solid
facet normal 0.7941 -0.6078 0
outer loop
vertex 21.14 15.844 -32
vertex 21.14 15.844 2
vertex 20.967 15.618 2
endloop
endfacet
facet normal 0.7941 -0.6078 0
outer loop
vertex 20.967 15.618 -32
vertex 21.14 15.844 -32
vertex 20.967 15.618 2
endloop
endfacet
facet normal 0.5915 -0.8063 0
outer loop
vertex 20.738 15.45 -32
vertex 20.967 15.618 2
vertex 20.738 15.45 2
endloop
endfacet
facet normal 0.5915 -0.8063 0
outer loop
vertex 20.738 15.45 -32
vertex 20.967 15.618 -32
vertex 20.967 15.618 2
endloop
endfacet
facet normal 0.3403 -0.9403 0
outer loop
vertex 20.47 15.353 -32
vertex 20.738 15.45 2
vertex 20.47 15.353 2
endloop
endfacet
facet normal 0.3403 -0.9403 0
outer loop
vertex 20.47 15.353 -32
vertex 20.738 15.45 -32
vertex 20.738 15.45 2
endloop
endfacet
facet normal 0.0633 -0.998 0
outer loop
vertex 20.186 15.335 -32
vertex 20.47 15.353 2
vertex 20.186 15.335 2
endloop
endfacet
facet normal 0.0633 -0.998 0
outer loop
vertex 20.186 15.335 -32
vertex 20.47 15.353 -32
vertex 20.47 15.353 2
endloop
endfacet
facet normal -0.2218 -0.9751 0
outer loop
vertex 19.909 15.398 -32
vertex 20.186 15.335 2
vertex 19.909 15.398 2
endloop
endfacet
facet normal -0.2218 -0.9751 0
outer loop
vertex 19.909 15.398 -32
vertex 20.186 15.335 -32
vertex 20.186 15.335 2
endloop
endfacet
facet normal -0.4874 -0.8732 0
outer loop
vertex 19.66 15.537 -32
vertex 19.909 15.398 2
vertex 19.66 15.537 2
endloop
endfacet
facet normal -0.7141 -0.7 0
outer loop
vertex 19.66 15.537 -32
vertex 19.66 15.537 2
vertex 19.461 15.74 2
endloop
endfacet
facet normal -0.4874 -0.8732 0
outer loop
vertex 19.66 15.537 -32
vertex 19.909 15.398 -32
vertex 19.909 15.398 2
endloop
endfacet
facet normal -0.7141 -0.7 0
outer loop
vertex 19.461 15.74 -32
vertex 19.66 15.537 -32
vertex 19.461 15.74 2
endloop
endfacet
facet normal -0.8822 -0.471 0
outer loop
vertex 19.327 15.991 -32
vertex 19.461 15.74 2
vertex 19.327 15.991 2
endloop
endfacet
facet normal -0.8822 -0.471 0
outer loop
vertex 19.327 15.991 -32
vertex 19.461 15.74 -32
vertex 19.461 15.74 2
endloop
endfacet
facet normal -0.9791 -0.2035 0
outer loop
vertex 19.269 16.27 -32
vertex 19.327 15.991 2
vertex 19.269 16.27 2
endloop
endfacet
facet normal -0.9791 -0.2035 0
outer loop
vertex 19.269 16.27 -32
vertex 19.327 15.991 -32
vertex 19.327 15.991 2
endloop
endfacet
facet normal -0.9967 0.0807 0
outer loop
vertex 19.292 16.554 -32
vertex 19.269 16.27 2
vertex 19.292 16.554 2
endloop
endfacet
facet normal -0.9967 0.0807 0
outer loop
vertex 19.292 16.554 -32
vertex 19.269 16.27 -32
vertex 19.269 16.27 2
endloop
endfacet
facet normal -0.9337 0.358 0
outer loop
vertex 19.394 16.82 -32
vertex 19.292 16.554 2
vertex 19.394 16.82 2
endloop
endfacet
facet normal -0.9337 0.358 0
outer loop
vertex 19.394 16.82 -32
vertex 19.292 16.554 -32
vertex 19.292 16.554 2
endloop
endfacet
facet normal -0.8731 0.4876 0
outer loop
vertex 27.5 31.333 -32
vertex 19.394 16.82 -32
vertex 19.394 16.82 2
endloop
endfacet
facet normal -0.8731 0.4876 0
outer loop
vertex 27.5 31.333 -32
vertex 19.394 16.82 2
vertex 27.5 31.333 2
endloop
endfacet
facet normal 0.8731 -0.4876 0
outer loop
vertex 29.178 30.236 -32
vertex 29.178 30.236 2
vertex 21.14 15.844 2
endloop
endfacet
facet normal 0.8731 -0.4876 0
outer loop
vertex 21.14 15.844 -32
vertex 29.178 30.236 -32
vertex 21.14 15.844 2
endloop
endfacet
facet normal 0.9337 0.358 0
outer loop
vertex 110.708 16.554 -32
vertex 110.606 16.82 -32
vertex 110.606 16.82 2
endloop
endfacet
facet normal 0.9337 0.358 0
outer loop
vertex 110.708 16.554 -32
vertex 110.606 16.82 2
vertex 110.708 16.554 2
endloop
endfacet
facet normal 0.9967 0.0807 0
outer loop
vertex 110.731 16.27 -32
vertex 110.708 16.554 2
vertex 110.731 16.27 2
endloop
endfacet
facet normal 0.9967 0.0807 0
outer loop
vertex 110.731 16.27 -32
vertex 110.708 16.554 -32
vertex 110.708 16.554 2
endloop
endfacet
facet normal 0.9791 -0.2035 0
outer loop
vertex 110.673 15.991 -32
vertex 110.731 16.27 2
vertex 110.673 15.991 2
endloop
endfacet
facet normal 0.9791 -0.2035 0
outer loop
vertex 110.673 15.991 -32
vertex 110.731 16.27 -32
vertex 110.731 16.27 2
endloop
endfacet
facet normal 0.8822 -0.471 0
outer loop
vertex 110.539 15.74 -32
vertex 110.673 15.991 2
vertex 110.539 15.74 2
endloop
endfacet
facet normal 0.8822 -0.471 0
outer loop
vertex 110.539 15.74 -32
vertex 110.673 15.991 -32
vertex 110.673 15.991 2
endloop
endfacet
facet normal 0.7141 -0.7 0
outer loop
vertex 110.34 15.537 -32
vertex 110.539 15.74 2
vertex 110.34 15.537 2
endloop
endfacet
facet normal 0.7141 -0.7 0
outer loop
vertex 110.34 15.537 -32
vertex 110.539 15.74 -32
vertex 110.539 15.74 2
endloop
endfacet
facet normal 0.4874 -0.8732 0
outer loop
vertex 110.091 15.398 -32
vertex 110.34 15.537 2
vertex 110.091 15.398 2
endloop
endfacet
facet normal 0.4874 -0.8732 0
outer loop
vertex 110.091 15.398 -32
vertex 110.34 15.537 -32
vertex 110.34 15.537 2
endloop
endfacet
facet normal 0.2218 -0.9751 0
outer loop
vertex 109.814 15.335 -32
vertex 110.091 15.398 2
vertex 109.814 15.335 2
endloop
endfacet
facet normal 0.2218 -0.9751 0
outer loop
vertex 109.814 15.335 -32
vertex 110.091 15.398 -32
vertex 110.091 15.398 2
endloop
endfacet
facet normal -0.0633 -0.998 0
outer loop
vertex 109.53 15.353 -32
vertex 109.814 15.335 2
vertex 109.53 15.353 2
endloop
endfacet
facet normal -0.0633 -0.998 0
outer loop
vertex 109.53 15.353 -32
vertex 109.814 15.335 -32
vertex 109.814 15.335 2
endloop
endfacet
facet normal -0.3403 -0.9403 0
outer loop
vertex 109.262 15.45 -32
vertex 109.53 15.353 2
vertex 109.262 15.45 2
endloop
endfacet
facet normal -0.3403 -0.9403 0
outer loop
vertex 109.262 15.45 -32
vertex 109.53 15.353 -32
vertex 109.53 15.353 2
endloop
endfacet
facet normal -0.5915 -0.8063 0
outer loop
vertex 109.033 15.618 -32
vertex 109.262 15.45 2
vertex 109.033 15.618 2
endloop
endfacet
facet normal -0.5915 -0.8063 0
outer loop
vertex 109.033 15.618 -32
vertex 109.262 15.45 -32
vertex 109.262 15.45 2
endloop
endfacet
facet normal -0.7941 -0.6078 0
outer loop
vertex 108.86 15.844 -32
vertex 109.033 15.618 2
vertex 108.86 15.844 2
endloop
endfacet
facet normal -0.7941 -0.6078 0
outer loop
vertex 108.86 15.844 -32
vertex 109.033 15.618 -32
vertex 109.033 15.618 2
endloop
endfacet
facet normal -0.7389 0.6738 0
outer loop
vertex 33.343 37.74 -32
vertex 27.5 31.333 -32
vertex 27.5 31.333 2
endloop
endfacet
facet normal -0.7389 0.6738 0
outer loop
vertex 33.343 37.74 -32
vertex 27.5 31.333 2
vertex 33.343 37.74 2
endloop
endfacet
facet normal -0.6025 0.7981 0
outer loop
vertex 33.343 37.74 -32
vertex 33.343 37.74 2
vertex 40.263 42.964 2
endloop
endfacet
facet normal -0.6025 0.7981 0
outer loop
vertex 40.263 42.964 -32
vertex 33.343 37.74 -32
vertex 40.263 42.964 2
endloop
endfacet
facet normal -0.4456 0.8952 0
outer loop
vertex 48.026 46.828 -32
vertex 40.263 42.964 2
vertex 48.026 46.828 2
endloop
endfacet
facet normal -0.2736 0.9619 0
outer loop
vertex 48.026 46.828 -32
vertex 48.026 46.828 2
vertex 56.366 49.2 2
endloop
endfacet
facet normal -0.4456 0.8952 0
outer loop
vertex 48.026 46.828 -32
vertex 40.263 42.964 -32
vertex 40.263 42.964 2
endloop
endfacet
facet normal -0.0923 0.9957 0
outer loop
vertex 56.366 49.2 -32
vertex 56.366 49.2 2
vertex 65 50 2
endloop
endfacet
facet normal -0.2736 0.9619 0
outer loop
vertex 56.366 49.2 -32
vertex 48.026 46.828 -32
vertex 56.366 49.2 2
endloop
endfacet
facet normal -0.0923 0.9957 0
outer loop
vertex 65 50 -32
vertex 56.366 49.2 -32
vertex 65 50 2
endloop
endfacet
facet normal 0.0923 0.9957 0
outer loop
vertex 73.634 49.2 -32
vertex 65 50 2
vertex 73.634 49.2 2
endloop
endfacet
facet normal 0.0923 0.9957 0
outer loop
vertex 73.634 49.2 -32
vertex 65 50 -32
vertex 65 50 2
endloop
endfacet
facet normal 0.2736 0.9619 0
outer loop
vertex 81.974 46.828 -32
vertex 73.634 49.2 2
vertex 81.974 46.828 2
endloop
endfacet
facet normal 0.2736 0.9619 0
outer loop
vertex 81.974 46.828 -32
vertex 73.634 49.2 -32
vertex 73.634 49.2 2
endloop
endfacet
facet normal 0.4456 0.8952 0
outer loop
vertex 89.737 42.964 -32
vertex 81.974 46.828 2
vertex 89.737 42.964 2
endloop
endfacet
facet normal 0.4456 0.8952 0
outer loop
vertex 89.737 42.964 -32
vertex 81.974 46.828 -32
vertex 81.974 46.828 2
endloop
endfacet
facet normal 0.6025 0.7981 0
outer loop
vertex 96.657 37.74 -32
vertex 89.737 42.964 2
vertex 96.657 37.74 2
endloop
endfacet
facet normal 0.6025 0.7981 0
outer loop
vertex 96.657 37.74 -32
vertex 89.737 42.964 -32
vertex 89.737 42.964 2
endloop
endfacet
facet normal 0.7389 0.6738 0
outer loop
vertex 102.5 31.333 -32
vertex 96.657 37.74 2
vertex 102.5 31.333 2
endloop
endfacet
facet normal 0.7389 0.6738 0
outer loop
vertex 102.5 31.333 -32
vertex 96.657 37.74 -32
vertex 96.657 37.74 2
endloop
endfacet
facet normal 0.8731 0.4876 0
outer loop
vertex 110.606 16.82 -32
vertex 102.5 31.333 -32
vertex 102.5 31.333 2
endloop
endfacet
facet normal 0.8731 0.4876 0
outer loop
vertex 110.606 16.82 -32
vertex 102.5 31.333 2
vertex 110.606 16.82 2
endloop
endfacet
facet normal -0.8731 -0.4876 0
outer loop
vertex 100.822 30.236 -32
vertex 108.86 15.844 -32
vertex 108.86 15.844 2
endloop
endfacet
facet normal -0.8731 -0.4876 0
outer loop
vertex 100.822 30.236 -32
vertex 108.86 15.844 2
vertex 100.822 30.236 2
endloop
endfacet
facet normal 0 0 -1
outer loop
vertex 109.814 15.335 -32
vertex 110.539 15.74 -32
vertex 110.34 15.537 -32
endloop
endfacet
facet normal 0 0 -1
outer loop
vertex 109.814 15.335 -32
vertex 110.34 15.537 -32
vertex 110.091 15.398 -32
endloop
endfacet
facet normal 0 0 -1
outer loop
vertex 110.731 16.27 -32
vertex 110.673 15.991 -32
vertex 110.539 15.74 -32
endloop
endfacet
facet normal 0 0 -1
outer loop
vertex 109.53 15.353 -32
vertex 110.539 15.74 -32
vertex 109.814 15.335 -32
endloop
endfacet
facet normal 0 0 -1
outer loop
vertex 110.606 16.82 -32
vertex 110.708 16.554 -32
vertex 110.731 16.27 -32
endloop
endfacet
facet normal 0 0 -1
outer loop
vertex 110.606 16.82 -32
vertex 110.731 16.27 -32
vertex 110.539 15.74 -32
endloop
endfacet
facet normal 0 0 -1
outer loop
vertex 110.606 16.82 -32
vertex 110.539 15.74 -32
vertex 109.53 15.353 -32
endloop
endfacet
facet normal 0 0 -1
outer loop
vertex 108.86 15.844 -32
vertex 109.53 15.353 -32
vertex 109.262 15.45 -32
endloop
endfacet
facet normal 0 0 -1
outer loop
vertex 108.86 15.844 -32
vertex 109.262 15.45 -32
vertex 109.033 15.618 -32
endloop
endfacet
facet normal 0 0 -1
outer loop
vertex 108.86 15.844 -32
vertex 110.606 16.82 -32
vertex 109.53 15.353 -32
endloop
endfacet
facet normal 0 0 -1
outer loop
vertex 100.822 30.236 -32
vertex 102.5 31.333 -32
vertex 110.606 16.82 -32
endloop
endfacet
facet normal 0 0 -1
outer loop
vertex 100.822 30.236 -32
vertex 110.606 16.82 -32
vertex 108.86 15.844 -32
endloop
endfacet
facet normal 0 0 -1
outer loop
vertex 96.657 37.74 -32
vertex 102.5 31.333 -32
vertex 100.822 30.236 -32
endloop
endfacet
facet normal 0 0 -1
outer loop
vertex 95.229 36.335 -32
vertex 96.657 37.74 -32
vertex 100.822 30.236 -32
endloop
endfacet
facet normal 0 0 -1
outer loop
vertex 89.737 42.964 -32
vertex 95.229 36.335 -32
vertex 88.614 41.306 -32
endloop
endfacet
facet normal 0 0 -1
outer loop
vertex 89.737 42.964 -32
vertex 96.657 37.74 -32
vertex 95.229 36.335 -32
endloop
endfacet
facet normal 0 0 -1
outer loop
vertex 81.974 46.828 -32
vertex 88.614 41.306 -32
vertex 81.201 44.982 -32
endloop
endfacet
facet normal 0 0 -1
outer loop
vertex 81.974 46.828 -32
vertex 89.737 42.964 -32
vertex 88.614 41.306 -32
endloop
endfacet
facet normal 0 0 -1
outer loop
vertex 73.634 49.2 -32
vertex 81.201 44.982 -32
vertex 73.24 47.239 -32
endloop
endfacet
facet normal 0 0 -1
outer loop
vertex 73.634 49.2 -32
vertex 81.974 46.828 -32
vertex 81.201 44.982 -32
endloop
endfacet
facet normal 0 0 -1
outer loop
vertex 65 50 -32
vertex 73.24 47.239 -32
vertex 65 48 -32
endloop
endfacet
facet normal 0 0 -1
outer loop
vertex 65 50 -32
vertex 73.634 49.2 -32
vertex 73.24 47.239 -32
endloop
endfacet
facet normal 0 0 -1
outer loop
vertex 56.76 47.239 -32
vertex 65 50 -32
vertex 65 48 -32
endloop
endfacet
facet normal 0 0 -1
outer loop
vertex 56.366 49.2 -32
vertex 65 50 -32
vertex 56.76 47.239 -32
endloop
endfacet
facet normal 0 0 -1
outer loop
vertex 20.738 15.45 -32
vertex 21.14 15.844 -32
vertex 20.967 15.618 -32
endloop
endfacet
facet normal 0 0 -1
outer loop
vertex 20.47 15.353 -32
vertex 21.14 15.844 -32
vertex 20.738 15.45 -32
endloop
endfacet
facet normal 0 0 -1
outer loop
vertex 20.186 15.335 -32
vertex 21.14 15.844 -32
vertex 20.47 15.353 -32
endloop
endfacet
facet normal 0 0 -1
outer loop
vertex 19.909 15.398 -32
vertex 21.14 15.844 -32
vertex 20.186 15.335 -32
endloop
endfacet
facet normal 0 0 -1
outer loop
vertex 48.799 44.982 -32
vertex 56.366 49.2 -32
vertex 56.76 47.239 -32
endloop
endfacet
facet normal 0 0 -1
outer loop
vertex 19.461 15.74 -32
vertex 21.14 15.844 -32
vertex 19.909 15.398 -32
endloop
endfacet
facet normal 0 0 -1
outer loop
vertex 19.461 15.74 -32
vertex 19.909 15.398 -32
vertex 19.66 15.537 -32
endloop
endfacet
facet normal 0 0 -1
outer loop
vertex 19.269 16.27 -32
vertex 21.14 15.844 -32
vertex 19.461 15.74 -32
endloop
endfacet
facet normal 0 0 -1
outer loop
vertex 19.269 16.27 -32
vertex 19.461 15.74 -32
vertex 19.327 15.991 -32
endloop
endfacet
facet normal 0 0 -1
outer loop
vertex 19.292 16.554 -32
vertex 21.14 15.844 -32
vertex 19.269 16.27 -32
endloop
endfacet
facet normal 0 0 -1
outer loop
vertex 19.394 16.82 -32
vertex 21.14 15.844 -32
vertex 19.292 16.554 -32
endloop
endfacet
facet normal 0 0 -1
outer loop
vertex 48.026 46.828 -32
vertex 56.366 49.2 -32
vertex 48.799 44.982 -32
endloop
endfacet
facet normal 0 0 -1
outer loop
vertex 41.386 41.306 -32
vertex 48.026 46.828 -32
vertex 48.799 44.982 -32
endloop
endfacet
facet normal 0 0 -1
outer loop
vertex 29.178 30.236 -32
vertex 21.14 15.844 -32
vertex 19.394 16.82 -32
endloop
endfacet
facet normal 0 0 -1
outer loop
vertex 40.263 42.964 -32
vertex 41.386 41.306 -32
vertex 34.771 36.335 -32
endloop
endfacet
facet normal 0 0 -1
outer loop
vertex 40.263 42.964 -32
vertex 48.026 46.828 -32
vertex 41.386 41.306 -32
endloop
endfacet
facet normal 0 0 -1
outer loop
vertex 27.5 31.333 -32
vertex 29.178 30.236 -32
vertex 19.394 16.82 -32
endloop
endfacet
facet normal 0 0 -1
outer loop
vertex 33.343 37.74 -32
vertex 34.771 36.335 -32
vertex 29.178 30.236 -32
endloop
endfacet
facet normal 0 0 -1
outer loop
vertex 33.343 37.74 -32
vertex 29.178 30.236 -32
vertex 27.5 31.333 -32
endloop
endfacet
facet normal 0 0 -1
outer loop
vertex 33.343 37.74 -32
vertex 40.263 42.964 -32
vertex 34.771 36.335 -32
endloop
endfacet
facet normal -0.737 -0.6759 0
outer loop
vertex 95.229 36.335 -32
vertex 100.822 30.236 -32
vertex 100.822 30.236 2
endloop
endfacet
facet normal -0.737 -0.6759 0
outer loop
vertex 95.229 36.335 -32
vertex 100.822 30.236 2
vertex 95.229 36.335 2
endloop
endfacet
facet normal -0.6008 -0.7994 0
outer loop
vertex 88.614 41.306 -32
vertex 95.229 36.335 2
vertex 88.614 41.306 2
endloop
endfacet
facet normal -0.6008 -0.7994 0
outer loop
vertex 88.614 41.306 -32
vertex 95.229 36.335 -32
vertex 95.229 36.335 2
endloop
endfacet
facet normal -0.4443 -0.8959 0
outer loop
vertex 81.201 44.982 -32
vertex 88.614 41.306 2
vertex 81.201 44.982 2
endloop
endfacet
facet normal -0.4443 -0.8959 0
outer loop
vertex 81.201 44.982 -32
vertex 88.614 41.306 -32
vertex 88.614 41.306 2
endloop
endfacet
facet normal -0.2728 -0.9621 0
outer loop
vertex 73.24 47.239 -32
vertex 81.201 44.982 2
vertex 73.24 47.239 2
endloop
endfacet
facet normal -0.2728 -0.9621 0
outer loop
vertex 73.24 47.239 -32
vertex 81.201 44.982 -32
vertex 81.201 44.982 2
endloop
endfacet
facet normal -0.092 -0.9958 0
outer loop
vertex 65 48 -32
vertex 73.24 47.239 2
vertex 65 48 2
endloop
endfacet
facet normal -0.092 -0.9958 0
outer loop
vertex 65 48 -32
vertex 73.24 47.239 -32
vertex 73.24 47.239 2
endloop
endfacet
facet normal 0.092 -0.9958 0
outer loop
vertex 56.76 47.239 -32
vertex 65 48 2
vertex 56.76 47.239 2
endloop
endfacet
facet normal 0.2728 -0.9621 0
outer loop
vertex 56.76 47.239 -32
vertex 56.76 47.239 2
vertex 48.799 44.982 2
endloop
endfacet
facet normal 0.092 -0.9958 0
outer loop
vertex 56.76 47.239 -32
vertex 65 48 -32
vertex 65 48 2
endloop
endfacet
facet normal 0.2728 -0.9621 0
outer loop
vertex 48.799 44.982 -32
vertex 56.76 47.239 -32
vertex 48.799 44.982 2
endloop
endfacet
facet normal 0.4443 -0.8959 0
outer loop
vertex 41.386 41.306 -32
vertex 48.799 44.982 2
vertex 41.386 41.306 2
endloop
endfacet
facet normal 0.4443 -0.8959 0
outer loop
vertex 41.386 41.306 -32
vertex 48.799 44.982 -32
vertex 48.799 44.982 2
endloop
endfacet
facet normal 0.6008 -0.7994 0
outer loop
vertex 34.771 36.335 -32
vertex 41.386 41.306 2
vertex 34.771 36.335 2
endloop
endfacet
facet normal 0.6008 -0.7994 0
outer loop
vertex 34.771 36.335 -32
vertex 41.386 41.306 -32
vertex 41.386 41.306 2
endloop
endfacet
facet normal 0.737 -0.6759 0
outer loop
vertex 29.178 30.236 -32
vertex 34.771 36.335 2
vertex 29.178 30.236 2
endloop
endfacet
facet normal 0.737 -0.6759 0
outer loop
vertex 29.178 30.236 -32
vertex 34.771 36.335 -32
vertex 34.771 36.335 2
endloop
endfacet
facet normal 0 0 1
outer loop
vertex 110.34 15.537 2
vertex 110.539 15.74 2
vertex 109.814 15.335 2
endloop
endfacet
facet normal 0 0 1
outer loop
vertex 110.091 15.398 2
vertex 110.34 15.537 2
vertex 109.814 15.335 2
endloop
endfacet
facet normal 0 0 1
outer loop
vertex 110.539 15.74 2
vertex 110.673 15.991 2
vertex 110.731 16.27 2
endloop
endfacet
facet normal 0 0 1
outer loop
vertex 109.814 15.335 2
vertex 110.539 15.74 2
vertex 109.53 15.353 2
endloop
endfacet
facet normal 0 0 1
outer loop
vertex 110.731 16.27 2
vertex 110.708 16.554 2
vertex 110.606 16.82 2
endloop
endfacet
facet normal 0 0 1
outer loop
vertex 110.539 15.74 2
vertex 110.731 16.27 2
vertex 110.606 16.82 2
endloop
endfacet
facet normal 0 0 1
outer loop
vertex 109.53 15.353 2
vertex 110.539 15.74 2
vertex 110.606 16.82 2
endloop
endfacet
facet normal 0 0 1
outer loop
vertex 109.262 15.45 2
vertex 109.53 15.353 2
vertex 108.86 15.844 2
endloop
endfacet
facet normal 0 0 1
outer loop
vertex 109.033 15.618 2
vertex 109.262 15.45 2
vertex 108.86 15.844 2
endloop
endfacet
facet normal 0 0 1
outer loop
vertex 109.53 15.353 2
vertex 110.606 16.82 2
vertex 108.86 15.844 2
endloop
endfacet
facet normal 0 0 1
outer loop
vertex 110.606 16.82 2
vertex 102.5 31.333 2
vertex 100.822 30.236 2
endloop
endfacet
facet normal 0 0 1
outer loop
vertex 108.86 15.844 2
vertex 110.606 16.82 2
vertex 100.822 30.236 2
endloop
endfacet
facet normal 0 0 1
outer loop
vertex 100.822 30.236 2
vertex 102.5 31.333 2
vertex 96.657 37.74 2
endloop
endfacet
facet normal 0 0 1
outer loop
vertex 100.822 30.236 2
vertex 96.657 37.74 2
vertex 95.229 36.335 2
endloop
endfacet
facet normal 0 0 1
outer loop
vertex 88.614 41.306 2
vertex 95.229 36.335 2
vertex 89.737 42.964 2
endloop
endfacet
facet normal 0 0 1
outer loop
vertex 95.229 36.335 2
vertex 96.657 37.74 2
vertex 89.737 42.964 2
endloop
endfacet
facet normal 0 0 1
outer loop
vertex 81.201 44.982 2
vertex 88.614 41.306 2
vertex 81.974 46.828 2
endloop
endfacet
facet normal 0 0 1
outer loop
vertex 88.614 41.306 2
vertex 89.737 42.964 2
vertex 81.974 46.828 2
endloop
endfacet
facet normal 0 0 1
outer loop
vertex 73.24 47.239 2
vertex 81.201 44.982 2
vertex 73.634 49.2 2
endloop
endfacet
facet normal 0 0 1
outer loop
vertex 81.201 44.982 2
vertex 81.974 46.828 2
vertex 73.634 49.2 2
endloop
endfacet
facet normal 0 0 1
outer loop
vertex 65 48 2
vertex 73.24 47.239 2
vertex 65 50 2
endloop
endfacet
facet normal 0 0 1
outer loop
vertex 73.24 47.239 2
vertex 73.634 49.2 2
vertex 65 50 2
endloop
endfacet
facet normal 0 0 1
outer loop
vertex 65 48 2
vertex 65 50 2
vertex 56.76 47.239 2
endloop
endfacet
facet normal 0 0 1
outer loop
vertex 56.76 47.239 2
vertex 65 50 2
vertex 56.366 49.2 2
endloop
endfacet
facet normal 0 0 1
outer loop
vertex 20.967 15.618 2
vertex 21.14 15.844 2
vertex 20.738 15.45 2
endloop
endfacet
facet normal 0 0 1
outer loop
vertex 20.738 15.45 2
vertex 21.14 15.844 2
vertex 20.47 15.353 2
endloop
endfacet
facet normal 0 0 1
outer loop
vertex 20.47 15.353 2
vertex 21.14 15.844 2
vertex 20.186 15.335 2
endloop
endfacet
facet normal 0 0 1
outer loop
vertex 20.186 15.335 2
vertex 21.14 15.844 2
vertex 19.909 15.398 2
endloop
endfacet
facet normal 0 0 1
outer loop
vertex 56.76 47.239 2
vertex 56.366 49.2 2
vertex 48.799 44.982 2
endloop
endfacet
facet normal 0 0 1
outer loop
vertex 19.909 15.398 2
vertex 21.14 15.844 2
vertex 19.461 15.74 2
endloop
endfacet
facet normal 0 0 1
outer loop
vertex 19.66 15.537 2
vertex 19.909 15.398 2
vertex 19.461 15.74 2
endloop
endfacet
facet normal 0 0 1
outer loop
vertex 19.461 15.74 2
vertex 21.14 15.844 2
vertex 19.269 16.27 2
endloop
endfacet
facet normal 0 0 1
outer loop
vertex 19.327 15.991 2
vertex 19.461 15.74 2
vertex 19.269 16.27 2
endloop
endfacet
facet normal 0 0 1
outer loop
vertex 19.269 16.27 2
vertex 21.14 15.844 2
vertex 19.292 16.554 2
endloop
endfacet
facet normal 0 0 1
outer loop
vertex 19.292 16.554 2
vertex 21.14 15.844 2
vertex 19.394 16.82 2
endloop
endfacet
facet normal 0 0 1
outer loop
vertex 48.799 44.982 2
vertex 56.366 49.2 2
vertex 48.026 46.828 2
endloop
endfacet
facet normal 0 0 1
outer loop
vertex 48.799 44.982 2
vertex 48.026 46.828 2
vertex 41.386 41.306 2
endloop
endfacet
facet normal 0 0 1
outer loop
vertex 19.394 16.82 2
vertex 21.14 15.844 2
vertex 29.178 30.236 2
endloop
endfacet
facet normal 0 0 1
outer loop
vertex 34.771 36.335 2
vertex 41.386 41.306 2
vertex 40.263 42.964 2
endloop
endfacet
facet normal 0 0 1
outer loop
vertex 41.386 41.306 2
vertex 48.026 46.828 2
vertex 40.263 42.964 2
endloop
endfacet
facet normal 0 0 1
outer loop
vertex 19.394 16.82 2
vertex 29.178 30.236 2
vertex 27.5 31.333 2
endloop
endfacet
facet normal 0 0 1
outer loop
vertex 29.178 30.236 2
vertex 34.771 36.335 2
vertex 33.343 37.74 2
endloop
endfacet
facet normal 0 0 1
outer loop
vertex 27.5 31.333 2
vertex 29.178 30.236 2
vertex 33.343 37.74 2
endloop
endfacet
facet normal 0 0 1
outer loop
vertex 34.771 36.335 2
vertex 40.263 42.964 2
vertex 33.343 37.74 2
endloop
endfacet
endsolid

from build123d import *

# Parameters (mm, degrees)
BOSS_EXTRUDE1_DEPTH      = 2
BOSS_EXTRUDE1_DEPTH_BACK = 32


with BuildPart() as part:
    # Sketch2 → Boss-Extrude1 (new, two sides: drawn at the far end of the back side and taken through both)
    with BuildSketch(Plane.XY.offset(-BOSS_EXTRUDE1_DEPTH_BACK)):
        with BuildLine():
            Line((102.5, 31.332843133), (110.605952255, 16.81955568))
            ThreePointArc((110.605952255, 16.81955568), (110.22051471, 15.458880149), (108.859839179, 15.844317694))
            Line((108.859839179, 15.844317694), (100.821862298, 30.235898765))
            ThreePointArc((100.821862298, 30.235898765), (65, 48), (29.178137702, 30.235898765))
            Line((29.178137702, 30.235898765), (21.140160821, 15.844317694))
            ThreePointArc((21.140160821, 15.844317694), (19.77948529, 15.458880149), (19.394047745, 16.81955568))
            Line((19.394047745, 16.81955568), (27.5, 31.332843133))
            ThreePointArc((27.5, 31.332843133), (65, 50), (102.5, 31.332843133))
        make_face()
    extrude(amount=BOSS_EXTRUDE1_DEPTH + BOSS_EXTRUDE1_DEPTH_BACK)


solid = part.part
